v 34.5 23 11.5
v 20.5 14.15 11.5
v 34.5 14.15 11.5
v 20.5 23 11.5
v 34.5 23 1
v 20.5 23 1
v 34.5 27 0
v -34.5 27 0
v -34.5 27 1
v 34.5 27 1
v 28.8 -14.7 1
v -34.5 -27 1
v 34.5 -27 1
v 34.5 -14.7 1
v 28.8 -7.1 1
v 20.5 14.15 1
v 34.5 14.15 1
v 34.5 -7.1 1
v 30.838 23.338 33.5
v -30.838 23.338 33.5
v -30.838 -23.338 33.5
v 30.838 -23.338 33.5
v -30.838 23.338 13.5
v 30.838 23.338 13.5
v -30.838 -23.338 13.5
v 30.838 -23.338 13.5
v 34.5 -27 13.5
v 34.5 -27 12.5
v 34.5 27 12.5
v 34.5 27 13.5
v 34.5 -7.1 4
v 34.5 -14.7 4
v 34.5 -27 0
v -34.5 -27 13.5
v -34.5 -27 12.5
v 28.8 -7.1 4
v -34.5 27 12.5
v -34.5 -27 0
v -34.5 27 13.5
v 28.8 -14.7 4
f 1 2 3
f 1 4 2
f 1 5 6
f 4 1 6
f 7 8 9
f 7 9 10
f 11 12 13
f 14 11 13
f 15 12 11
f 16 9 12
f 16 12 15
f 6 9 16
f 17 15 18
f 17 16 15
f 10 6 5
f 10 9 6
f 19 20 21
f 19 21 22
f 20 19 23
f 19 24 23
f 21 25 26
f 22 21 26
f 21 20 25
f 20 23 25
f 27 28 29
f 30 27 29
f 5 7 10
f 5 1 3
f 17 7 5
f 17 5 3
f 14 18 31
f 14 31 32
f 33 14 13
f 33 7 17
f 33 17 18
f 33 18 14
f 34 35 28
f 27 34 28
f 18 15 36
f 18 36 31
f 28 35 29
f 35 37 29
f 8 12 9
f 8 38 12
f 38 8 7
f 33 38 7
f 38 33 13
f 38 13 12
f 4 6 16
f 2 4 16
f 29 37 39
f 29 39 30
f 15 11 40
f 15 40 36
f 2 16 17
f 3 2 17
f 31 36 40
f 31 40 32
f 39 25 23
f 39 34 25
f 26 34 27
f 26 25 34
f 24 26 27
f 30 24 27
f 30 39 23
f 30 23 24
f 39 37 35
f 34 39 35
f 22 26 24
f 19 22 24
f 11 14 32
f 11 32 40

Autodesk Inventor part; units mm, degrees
ref_plane "YZ Plane" through (0, 0, 0) normal (1, 0, 0) x (0, 1, 0)
ref_plane "XZ Plane" through (0, 0, 0) normal (0, 1, 0) x (-1, 0, 0)
ref_plane "XY Plane" through (0, 0, 0) normal (0, 0, 1) x (1, 0, 0)
sketch "Sketch1" plane through (0, 0, 0) normal (0, 0, 1) x (1, 0, 0)
  line L0 (-34.5, 27) -> (34.5, 27)
  line L1 (34.5, 27) -> (34.5, -27)
  line L2 (34.5, -27) -> (-34.5, -27)
  line L3 (-34.5, -27) -> (-34.5, 27)
  line L4 (-34.5, 27) -> (34.5, -27) construction
  line L5 (34.5, 27) -> (-34.5, -27) construction
  point P0 (0, 0)
  dimension "d0" = 69
  dimension "d1" = 54
extrude "Extrusion1" add sketch "Sketch1" along normal blind 1
sketch "Sketch2" plane through (0, 0, 1) normal (0, 0, 1) x (1, 0, 0)
  line L0 (34.5, 23) -> (20.5, 23)
  line L1 (20.5, 23) -> (20.5, 14.15)
  line L2 (20.5, 14.15) -> (34.5, 14.15)
  line L3 (34.5, 14.15) -> (34.5, 23)
  line L4 (28.8, -7.1) -> (34.5, -7.1)
  line L5 (34.5, -7.1) -> (34.5, -14.7)
  line L6 (34.5, -14.7) -> (28.8, -14.7)
  line L7 (28.8, -14.7) -> (28.8, -7.1)
  line L8 (34.5, -27) -> (34.5, 27) projected
  line L9 (34.5, 27) -> (-34.5, 27) projected
  line L10 (-34.5, -27) -> (34.5, -27) projected
  point P0 (0, 0)
  dimension "d4" = 8.85
  dimension "d5" = 14
  dimension "d6" = 4
  dimension "d7" = 7.6
  dimension "d8" = 5.7
  dimension "d9" = 12.3
extrude "Extrusion2" add sketch "Sketch2" along normal blind 10.5 contours L3 L2 L1 L0
extrude "Extrusion3" add sketch "Sketch2" along normal blind 3 contours L5 L6 L7 L4
ref_plane "Work Plane1" through (0, 0, 12.5) normal (0, 0, 1) x (1, 0, 0)
sketch "Sketch3" plane through (0, 0, 12.5) normal (0, 0, 1) x (1, 0, 0)
  line L0 (-34.5, 27) -> (34.5, 27) projected
  line L1 (-34.5, -27) -> (34.5, -27) projected
  line L2 (34.5, 27) -> (-34.5, 27)
  line L3 (-34.5, 27) -> (-34.5, -27)
  line L4 (-34.5, -27) -> (34.5, -27)
  line L5 (34.5, -27) -> (34.5, 27)
  point P0 (0, 0)
extrude "Extrusion4" add sketch "Sketch3" along normal blind 1
sketch "Sketch4" plane through (0, 0, 13.5) normal (0, 0, 1) x (1, 0, 0)
  line L0 (-34.5, -27) -> (34.5, -27) projected
  line L1 (34.5, 27) -> (-34.5, 27)
  line L2 (-34.5, 27) -> (-34.5, -27)
  line L3 (-34.5, -27) -> (34.5, -27)
  line L4 (34.5, -27) -> (34.5, 27)
  line L5 (30.8377, 23.3377) -> (-30.8377, 23.3377)
  line L6 (-30.8377, 23.3377) -> (-30.8377, -23.3377)
  line L7 (-30.8377, -23.3377) -> (30.8377, -23.3377)
  line L8 (30.8377, -23.3377) -> (30.8377, 23.3377)
  point P0 (0, 0)
extrude "Extrusion5" add sketch "Sketch4" along normal blind 20 contours L8 L7 L6 L5
properties part number "Arduino"
